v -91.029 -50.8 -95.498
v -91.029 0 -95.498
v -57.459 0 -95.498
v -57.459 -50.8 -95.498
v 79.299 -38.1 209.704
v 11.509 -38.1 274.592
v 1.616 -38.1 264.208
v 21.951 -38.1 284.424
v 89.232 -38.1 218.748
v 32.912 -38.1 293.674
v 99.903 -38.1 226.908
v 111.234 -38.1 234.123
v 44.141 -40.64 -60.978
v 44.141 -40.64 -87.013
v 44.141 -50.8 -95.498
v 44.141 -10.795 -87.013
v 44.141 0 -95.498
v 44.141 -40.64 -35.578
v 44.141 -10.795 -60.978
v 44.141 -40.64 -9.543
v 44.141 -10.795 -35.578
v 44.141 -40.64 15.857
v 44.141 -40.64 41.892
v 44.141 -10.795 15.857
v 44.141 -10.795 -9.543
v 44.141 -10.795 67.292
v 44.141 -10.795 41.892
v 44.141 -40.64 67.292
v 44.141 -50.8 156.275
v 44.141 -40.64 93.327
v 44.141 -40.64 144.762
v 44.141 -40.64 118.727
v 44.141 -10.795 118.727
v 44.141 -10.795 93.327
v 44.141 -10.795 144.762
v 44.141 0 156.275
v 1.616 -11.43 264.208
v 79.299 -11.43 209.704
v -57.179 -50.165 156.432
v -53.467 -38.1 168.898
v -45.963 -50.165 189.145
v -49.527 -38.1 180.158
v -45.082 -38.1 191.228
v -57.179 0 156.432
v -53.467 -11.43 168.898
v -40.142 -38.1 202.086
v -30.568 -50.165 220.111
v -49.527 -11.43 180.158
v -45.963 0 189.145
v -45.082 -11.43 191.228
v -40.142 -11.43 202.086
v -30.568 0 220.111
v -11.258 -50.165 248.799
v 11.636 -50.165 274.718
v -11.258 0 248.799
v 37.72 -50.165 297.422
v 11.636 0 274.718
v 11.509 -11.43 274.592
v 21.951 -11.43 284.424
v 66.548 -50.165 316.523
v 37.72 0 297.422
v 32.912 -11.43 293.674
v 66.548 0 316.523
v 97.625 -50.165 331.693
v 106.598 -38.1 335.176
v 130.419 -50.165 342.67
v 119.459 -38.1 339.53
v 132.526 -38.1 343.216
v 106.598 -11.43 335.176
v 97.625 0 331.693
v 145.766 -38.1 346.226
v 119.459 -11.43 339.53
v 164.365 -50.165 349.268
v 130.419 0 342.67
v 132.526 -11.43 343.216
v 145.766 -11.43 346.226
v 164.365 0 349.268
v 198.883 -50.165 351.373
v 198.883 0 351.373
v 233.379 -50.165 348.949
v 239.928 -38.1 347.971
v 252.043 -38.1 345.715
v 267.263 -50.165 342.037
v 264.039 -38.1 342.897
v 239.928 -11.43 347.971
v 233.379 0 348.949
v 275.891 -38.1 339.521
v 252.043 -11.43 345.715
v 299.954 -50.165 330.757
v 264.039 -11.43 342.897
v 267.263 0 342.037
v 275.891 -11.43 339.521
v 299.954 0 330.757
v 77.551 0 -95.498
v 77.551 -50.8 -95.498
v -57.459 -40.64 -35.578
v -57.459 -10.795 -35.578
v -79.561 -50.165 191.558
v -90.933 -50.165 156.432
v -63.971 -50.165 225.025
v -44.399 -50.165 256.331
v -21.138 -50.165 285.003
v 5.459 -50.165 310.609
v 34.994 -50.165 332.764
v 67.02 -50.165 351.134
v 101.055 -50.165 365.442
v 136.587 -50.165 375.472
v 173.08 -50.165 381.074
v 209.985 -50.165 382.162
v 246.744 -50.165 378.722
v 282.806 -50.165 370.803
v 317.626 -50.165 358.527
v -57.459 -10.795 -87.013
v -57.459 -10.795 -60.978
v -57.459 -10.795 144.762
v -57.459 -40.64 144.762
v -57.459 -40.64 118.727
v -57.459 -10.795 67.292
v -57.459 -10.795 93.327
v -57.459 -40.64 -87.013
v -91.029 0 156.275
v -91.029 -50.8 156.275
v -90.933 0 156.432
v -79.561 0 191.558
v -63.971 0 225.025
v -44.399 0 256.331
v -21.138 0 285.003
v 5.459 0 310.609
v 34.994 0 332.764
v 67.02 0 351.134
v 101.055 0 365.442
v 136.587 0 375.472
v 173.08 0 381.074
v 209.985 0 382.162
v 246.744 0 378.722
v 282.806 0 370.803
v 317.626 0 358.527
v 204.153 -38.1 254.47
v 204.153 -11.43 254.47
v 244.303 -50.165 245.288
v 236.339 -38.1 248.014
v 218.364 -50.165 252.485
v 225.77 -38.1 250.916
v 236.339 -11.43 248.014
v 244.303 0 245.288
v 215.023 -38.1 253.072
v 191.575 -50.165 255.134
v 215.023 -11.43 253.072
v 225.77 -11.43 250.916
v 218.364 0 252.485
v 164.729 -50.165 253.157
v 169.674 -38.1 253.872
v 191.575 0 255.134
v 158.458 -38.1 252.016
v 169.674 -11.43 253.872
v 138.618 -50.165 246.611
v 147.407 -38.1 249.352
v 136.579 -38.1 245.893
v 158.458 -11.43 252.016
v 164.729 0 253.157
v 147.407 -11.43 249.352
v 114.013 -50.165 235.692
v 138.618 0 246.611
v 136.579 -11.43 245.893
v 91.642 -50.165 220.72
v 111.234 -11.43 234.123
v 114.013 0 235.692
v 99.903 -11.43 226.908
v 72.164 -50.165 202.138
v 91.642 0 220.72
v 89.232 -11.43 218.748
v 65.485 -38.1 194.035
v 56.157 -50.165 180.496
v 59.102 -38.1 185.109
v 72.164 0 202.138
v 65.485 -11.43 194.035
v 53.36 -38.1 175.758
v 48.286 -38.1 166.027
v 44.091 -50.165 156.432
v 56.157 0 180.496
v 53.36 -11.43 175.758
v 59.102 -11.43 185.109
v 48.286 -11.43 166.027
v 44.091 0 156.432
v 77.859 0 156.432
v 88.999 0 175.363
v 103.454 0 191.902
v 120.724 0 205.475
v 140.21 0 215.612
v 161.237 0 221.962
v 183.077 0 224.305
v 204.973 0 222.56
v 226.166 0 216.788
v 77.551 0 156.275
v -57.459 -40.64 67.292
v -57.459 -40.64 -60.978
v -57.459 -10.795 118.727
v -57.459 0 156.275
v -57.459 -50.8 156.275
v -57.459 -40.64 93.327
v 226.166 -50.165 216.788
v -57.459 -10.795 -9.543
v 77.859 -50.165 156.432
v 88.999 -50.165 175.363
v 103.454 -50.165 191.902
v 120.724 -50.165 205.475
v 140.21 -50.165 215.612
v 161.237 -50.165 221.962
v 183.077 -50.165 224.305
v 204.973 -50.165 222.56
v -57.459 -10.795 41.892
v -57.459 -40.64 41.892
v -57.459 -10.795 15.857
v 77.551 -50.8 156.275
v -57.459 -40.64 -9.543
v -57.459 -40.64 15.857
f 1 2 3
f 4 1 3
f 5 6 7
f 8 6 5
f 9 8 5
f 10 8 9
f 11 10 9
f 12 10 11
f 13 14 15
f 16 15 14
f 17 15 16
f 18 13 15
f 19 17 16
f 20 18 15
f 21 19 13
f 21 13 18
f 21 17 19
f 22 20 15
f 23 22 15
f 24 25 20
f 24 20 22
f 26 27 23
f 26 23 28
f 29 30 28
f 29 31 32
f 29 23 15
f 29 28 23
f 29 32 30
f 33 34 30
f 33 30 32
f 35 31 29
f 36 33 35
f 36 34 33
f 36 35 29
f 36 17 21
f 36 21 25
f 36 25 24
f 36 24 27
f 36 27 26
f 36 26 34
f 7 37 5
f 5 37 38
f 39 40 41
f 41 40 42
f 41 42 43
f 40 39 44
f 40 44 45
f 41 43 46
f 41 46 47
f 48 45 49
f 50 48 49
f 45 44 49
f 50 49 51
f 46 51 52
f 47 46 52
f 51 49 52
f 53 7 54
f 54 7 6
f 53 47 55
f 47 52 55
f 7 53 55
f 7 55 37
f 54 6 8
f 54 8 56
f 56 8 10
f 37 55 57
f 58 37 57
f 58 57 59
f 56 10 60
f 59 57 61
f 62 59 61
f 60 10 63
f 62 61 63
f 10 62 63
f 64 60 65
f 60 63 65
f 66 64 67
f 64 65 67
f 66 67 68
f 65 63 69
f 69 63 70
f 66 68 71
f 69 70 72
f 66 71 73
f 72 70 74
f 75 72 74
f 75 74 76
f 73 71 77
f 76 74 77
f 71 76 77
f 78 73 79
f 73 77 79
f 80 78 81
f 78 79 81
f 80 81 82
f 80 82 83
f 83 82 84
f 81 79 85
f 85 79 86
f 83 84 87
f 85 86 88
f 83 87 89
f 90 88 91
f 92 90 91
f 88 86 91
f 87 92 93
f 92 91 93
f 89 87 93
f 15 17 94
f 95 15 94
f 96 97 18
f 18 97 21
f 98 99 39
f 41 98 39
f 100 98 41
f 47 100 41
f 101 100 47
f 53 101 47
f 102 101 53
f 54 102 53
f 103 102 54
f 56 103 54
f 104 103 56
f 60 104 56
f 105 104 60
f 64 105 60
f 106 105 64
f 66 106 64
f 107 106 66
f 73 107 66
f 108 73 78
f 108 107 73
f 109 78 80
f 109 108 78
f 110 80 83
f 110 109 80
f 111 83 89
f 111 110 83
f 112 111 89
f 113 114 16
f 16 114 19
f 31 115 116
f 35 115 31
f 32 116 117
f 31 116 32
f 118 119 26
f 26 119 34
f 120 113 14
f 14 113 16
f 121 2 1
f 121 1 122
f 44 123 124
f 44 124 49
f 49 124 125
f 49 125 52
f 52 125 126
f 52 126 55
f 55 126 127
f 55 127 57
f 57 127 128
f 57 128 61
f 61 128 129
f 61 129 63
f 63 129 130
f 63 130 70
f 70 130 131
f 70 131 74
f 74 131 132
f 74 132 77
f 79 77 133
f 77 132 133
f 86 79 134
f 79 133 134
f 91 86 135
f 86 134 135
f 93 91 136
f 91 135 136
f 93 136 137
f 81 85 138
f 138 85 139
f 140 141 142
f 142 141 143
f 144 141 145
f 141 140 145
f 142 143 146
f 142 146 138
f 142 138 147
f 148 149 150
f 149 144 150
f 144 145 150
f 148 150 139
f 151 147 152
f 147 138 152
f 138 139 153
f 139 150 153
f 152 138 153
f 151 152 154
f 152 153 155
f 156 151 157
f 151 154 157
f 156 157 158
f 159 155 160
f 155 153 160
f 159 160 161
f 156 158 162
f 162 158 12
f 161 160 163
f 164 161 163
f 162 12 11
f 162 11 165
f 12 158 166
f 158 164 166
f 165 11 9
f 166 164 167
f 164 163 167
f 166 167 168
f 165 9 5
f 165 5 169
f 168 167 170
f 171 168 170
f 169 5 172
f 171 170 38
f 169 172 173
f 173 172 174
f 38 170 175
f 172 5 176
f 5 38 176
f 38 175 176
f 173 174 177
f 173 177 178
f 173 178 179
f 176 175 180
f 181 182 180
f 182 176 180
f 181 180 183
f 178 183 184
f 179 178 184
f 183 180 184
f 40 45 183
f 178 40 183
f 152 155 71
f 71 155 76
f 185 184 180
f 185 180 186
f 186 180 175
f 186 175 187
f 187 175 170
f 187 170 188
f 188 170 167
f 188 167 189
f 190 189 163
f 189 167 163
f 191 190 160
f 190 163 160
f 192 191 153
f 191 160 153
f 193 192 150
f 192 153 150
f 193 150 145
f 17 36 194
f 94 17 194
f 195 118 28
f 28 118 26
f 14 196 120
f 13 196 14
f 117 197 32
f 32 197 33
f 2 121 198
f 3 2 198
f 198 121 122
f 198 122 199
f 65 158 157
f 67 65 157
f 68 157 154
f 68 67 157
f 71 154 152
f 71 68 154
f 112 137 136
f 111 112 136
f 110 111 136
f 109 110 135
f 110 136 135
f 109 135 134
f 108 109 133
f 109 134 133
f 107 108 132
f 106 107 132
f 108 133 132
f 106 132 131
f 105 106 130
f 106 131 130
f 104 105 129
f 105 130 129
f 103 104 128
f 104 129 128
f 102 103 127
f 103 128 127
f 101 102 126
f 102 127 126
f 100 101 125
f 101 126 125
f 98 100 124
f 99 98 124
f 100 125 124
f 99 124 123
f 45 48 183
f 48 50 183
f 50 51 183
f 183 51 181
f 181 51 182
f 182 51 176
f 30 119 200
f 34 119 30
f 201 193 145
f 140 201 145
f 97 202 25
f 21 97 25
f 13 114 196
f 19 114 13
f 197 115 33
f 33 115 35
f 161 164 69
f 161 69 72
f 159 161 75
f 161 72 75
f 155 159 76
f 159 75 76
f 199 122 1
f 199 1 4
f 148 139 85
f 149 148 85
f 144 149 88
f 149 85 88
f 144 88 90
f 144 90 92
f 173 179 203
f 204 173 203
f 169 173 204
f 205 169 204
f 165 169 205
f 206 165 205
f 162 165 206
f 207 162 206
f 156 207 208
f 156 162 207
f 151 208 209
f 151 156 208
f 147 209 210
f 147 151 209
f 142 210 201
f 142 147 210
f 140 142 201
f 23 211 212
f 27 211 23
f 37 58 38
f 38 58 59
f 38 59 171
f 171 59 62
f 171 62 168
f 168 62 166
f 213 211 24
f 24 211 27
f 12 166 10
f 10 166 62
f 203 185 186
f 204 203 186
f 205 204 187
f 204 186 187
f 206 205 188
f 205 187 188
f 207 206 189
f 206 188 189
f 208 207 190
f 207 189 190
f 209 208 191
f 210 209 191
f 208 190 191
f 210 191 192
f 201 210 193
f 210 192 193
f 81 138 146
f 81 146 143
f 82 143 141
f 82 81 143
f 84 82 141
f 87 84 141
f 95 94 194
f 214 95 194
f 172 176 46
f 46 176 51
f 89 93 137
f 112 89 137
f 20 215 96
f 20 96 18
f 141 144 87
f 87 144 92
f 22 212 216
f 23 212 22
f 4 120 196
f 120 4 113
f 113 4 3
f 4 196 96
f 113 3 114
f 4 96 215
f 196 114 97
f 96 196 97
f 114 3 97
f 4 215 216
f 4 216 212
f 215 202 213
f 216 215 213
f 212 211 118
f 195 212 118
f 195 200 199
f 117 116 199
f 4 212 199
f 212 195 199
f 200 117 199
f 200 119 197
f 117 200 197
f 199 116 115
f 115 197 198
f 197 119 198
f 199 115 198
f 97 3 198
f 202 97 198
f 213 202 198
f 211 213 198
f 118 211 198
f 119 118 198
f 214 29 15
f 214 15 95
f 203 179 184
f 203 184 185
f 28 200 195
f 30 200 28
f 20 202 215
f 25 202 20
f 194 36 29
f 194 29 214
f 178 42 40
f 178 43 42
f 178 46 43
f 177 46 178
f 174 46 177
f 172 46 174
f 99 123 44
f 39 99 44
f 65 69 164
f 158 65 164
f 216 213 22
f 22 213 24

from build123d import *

# Parameters (mm, degrees)
F0_W      = 33.569794488
F0_H      = 251.7734586603
F1_DEPTH  = 50.8
F0_W_2    = 33.4098020662
F3_START  = 10.795
F2_W      = 102.4187883054
F2_H      = 26.035
F3_DEPTH  = 29.845
F11_DEPTH = 50.165
F13_START = 11.43
F13_DEPTH = 26.67


with BuildPart() as f1:
    # F0 (on Front) → F1 (new body)
    with BuildSketch(Plane.XZ):
        with Locations((-74.2440178493, 30.3884302496)):
            Rectangle(F0_W, F0_H)
    extrude(amount=F1_DEPTH)



with BuildPart() as f1b:
    # F0 (on Front) → F1, piece 2 (new body)
    with BuildSketch(Plane.XZ):
        with Locations((60.8457804278, 30.3884302496)):
            Rectangle(F0_W_2, F0_H)
    extrude(amount=F1_DEPTH)


with BuildPart() as f1_1:
    add(f1.part)

    add(f1b.part)  # F3 merges F1b
    # F2 (on Front) → F3 (join)
    with BuildSketch(Plane.XZ.offset(F3_START)):
        with Locations((-6.7171175033, -73.99544688)):
            Rectangle(F2_W, F2_H)
        with Locations((-6.7171175033, -22.56044688)):
            Rectangle(F2_W, F2_H)
        with Locations((-6.7171175033, 28.87455312)):
            Rectangle(F2_W, F2_H)
        with Locations((-6.7171175033, 80.30955312)):
            Rectangle(F2_W, F2_H)
        with Locations((-6.7171175033, 131.74455312)):
            Rectangle(F2_W, F2_H)
    extrude(amount=F3_DEPTH)


with BuildPart() as f4_1:
    # F4: instance of F1
    add(f1_1.part.mirror(Plane.YZ))


with BuildPart() as f5_1:
    # F5: instance of F1
    add(f1_1.part.mirror(Plane.XY))


with BuildPart() as f6_1:
    # F6: instance of F1
    add(f1_1.part.mirror(Plane.YZ))


with BuildPart() as f11:
    # F10 (on Front) → F11 (new body)
    with BuildSketch(Plane.XZ):
        with BuildLine():
            ThreePointArc((317.6255524159, 358.5268855095), (67.0199126253, 351.1337788217), (-90.9333527046, 156.4324416589))
            Line((-90.9333527046, 156.4324416589), (-57.1792276366, 156.4324416589))
            ThreePointArc((-57.1792276366, 156.4324416589), (81.8383182172, 324.6171235077), (299.9535881048, 330.756692356))
            Line((299.9535881048, 330.756692356), (317.6255524159, 358.5268855095))
        make_face()
    extrude(amount=F11_DEPTH)



with BuildPart() as f11b:
    # F10 (on Front) → F11, piece 2 (new body)
    with BuildSketch(Plane.XZ):
        with BuildLine():
            ThreePointArc((244.3029156162, 245.288268658), (126.0804399644, 241.6811233498), (44.0912485032, 156.4324416589))
            Line((44.0912485032, 156.4324416589), (77.8586367032, 156.4324416589))
            ThreePointArc((77.8586367032, 156.4324416589), (140.2099056023, 215.611676515), (226.1661707819, 216.7877070703))
            Line((226.1661707819, 216.7877070703), (244.3029156162, 245.288268658))
        make_face()
    extrude(amount=F11_DEPTH)


with BuildPart() as f11_1:
    add(f11.part)

    add(f11b.part)  # F13 merges F11b
    # F12 (on Front) → F13 (join)
    with BuildSketch(Plane.XZ.offset(F13_START)):
        with BuildLine():
            ThreePointArc((-43.8625849783, 202.3695260286), (-52.5242259082, 186.2460388504), (-58.7876923382, 169.0483689308))
            Line((-58.7876923382, 169.0483689308), (51.9357509911, 165.9245043993))
            ThreePointArc((51.9357509911, 165.9245043993), (61.3690280728, 179.5426083047), (69.9847117066, 193.6921477318))
            Line((69.9847117066, 193.6921477318), (-43.8625849783, 202.3695260286))
        make_face()
        with BuildLine():
            ThreePointArc((31.1100240797, 295.0440049171), (11.4700754124, 284.414915763), (-3.2524224371, 267.6234543324))
            Line((-3.2524224371, 267.6234543324), (82.8272476792, 207.2288691998))
            ThreePointArc((82.8272476792, 207.2288691998), (100.3836801831, 217.294466773), (115.1071190834, 231.1784476042))
            Line((115.1071190834, 231.1784476042), (31.1100240797, 295.0440049171))
        make_face()
        with BuildLine():
            ThreePointArc((143.9449191093, 353.2618284225), (123.4307079656, 350.1093100381), (104.229554534, 342.229783535))
            Line((104.229554534, 342.229783535), (137.6934200525, 242.5736486912))
            ThreePointArc((137.6934200525, 242.5736486912), (154.6414460699, 244.1725876619), (170.7895547152, 249.5606094599))
            Line((170.7895547152, 249.5606094599), (143.9449191093, 353.2618284225))
        make_face()
        with BuildLine():
            Line((233.0750375986, 240.4627352953), (279.4829308987, 347.8301465511))
            ThreePointArc((279.4829308987, 347.8301465511), (262.2436602761, 354.8104334145), (244.0870702267, 358.8421940804))
            Line((244.0870702267, 358.8421940804), (202.4147510529, 249.9283403158))
            ThreePointArc((202.4147510529, 249.9283403158), (217.2981445962, 243.748459178), (233.0750375986, 240.4627352953))
        make_face()
    extrude(amount=F13_DEPTH)


solid = Compound([f1_1.part, f11_1.part])
